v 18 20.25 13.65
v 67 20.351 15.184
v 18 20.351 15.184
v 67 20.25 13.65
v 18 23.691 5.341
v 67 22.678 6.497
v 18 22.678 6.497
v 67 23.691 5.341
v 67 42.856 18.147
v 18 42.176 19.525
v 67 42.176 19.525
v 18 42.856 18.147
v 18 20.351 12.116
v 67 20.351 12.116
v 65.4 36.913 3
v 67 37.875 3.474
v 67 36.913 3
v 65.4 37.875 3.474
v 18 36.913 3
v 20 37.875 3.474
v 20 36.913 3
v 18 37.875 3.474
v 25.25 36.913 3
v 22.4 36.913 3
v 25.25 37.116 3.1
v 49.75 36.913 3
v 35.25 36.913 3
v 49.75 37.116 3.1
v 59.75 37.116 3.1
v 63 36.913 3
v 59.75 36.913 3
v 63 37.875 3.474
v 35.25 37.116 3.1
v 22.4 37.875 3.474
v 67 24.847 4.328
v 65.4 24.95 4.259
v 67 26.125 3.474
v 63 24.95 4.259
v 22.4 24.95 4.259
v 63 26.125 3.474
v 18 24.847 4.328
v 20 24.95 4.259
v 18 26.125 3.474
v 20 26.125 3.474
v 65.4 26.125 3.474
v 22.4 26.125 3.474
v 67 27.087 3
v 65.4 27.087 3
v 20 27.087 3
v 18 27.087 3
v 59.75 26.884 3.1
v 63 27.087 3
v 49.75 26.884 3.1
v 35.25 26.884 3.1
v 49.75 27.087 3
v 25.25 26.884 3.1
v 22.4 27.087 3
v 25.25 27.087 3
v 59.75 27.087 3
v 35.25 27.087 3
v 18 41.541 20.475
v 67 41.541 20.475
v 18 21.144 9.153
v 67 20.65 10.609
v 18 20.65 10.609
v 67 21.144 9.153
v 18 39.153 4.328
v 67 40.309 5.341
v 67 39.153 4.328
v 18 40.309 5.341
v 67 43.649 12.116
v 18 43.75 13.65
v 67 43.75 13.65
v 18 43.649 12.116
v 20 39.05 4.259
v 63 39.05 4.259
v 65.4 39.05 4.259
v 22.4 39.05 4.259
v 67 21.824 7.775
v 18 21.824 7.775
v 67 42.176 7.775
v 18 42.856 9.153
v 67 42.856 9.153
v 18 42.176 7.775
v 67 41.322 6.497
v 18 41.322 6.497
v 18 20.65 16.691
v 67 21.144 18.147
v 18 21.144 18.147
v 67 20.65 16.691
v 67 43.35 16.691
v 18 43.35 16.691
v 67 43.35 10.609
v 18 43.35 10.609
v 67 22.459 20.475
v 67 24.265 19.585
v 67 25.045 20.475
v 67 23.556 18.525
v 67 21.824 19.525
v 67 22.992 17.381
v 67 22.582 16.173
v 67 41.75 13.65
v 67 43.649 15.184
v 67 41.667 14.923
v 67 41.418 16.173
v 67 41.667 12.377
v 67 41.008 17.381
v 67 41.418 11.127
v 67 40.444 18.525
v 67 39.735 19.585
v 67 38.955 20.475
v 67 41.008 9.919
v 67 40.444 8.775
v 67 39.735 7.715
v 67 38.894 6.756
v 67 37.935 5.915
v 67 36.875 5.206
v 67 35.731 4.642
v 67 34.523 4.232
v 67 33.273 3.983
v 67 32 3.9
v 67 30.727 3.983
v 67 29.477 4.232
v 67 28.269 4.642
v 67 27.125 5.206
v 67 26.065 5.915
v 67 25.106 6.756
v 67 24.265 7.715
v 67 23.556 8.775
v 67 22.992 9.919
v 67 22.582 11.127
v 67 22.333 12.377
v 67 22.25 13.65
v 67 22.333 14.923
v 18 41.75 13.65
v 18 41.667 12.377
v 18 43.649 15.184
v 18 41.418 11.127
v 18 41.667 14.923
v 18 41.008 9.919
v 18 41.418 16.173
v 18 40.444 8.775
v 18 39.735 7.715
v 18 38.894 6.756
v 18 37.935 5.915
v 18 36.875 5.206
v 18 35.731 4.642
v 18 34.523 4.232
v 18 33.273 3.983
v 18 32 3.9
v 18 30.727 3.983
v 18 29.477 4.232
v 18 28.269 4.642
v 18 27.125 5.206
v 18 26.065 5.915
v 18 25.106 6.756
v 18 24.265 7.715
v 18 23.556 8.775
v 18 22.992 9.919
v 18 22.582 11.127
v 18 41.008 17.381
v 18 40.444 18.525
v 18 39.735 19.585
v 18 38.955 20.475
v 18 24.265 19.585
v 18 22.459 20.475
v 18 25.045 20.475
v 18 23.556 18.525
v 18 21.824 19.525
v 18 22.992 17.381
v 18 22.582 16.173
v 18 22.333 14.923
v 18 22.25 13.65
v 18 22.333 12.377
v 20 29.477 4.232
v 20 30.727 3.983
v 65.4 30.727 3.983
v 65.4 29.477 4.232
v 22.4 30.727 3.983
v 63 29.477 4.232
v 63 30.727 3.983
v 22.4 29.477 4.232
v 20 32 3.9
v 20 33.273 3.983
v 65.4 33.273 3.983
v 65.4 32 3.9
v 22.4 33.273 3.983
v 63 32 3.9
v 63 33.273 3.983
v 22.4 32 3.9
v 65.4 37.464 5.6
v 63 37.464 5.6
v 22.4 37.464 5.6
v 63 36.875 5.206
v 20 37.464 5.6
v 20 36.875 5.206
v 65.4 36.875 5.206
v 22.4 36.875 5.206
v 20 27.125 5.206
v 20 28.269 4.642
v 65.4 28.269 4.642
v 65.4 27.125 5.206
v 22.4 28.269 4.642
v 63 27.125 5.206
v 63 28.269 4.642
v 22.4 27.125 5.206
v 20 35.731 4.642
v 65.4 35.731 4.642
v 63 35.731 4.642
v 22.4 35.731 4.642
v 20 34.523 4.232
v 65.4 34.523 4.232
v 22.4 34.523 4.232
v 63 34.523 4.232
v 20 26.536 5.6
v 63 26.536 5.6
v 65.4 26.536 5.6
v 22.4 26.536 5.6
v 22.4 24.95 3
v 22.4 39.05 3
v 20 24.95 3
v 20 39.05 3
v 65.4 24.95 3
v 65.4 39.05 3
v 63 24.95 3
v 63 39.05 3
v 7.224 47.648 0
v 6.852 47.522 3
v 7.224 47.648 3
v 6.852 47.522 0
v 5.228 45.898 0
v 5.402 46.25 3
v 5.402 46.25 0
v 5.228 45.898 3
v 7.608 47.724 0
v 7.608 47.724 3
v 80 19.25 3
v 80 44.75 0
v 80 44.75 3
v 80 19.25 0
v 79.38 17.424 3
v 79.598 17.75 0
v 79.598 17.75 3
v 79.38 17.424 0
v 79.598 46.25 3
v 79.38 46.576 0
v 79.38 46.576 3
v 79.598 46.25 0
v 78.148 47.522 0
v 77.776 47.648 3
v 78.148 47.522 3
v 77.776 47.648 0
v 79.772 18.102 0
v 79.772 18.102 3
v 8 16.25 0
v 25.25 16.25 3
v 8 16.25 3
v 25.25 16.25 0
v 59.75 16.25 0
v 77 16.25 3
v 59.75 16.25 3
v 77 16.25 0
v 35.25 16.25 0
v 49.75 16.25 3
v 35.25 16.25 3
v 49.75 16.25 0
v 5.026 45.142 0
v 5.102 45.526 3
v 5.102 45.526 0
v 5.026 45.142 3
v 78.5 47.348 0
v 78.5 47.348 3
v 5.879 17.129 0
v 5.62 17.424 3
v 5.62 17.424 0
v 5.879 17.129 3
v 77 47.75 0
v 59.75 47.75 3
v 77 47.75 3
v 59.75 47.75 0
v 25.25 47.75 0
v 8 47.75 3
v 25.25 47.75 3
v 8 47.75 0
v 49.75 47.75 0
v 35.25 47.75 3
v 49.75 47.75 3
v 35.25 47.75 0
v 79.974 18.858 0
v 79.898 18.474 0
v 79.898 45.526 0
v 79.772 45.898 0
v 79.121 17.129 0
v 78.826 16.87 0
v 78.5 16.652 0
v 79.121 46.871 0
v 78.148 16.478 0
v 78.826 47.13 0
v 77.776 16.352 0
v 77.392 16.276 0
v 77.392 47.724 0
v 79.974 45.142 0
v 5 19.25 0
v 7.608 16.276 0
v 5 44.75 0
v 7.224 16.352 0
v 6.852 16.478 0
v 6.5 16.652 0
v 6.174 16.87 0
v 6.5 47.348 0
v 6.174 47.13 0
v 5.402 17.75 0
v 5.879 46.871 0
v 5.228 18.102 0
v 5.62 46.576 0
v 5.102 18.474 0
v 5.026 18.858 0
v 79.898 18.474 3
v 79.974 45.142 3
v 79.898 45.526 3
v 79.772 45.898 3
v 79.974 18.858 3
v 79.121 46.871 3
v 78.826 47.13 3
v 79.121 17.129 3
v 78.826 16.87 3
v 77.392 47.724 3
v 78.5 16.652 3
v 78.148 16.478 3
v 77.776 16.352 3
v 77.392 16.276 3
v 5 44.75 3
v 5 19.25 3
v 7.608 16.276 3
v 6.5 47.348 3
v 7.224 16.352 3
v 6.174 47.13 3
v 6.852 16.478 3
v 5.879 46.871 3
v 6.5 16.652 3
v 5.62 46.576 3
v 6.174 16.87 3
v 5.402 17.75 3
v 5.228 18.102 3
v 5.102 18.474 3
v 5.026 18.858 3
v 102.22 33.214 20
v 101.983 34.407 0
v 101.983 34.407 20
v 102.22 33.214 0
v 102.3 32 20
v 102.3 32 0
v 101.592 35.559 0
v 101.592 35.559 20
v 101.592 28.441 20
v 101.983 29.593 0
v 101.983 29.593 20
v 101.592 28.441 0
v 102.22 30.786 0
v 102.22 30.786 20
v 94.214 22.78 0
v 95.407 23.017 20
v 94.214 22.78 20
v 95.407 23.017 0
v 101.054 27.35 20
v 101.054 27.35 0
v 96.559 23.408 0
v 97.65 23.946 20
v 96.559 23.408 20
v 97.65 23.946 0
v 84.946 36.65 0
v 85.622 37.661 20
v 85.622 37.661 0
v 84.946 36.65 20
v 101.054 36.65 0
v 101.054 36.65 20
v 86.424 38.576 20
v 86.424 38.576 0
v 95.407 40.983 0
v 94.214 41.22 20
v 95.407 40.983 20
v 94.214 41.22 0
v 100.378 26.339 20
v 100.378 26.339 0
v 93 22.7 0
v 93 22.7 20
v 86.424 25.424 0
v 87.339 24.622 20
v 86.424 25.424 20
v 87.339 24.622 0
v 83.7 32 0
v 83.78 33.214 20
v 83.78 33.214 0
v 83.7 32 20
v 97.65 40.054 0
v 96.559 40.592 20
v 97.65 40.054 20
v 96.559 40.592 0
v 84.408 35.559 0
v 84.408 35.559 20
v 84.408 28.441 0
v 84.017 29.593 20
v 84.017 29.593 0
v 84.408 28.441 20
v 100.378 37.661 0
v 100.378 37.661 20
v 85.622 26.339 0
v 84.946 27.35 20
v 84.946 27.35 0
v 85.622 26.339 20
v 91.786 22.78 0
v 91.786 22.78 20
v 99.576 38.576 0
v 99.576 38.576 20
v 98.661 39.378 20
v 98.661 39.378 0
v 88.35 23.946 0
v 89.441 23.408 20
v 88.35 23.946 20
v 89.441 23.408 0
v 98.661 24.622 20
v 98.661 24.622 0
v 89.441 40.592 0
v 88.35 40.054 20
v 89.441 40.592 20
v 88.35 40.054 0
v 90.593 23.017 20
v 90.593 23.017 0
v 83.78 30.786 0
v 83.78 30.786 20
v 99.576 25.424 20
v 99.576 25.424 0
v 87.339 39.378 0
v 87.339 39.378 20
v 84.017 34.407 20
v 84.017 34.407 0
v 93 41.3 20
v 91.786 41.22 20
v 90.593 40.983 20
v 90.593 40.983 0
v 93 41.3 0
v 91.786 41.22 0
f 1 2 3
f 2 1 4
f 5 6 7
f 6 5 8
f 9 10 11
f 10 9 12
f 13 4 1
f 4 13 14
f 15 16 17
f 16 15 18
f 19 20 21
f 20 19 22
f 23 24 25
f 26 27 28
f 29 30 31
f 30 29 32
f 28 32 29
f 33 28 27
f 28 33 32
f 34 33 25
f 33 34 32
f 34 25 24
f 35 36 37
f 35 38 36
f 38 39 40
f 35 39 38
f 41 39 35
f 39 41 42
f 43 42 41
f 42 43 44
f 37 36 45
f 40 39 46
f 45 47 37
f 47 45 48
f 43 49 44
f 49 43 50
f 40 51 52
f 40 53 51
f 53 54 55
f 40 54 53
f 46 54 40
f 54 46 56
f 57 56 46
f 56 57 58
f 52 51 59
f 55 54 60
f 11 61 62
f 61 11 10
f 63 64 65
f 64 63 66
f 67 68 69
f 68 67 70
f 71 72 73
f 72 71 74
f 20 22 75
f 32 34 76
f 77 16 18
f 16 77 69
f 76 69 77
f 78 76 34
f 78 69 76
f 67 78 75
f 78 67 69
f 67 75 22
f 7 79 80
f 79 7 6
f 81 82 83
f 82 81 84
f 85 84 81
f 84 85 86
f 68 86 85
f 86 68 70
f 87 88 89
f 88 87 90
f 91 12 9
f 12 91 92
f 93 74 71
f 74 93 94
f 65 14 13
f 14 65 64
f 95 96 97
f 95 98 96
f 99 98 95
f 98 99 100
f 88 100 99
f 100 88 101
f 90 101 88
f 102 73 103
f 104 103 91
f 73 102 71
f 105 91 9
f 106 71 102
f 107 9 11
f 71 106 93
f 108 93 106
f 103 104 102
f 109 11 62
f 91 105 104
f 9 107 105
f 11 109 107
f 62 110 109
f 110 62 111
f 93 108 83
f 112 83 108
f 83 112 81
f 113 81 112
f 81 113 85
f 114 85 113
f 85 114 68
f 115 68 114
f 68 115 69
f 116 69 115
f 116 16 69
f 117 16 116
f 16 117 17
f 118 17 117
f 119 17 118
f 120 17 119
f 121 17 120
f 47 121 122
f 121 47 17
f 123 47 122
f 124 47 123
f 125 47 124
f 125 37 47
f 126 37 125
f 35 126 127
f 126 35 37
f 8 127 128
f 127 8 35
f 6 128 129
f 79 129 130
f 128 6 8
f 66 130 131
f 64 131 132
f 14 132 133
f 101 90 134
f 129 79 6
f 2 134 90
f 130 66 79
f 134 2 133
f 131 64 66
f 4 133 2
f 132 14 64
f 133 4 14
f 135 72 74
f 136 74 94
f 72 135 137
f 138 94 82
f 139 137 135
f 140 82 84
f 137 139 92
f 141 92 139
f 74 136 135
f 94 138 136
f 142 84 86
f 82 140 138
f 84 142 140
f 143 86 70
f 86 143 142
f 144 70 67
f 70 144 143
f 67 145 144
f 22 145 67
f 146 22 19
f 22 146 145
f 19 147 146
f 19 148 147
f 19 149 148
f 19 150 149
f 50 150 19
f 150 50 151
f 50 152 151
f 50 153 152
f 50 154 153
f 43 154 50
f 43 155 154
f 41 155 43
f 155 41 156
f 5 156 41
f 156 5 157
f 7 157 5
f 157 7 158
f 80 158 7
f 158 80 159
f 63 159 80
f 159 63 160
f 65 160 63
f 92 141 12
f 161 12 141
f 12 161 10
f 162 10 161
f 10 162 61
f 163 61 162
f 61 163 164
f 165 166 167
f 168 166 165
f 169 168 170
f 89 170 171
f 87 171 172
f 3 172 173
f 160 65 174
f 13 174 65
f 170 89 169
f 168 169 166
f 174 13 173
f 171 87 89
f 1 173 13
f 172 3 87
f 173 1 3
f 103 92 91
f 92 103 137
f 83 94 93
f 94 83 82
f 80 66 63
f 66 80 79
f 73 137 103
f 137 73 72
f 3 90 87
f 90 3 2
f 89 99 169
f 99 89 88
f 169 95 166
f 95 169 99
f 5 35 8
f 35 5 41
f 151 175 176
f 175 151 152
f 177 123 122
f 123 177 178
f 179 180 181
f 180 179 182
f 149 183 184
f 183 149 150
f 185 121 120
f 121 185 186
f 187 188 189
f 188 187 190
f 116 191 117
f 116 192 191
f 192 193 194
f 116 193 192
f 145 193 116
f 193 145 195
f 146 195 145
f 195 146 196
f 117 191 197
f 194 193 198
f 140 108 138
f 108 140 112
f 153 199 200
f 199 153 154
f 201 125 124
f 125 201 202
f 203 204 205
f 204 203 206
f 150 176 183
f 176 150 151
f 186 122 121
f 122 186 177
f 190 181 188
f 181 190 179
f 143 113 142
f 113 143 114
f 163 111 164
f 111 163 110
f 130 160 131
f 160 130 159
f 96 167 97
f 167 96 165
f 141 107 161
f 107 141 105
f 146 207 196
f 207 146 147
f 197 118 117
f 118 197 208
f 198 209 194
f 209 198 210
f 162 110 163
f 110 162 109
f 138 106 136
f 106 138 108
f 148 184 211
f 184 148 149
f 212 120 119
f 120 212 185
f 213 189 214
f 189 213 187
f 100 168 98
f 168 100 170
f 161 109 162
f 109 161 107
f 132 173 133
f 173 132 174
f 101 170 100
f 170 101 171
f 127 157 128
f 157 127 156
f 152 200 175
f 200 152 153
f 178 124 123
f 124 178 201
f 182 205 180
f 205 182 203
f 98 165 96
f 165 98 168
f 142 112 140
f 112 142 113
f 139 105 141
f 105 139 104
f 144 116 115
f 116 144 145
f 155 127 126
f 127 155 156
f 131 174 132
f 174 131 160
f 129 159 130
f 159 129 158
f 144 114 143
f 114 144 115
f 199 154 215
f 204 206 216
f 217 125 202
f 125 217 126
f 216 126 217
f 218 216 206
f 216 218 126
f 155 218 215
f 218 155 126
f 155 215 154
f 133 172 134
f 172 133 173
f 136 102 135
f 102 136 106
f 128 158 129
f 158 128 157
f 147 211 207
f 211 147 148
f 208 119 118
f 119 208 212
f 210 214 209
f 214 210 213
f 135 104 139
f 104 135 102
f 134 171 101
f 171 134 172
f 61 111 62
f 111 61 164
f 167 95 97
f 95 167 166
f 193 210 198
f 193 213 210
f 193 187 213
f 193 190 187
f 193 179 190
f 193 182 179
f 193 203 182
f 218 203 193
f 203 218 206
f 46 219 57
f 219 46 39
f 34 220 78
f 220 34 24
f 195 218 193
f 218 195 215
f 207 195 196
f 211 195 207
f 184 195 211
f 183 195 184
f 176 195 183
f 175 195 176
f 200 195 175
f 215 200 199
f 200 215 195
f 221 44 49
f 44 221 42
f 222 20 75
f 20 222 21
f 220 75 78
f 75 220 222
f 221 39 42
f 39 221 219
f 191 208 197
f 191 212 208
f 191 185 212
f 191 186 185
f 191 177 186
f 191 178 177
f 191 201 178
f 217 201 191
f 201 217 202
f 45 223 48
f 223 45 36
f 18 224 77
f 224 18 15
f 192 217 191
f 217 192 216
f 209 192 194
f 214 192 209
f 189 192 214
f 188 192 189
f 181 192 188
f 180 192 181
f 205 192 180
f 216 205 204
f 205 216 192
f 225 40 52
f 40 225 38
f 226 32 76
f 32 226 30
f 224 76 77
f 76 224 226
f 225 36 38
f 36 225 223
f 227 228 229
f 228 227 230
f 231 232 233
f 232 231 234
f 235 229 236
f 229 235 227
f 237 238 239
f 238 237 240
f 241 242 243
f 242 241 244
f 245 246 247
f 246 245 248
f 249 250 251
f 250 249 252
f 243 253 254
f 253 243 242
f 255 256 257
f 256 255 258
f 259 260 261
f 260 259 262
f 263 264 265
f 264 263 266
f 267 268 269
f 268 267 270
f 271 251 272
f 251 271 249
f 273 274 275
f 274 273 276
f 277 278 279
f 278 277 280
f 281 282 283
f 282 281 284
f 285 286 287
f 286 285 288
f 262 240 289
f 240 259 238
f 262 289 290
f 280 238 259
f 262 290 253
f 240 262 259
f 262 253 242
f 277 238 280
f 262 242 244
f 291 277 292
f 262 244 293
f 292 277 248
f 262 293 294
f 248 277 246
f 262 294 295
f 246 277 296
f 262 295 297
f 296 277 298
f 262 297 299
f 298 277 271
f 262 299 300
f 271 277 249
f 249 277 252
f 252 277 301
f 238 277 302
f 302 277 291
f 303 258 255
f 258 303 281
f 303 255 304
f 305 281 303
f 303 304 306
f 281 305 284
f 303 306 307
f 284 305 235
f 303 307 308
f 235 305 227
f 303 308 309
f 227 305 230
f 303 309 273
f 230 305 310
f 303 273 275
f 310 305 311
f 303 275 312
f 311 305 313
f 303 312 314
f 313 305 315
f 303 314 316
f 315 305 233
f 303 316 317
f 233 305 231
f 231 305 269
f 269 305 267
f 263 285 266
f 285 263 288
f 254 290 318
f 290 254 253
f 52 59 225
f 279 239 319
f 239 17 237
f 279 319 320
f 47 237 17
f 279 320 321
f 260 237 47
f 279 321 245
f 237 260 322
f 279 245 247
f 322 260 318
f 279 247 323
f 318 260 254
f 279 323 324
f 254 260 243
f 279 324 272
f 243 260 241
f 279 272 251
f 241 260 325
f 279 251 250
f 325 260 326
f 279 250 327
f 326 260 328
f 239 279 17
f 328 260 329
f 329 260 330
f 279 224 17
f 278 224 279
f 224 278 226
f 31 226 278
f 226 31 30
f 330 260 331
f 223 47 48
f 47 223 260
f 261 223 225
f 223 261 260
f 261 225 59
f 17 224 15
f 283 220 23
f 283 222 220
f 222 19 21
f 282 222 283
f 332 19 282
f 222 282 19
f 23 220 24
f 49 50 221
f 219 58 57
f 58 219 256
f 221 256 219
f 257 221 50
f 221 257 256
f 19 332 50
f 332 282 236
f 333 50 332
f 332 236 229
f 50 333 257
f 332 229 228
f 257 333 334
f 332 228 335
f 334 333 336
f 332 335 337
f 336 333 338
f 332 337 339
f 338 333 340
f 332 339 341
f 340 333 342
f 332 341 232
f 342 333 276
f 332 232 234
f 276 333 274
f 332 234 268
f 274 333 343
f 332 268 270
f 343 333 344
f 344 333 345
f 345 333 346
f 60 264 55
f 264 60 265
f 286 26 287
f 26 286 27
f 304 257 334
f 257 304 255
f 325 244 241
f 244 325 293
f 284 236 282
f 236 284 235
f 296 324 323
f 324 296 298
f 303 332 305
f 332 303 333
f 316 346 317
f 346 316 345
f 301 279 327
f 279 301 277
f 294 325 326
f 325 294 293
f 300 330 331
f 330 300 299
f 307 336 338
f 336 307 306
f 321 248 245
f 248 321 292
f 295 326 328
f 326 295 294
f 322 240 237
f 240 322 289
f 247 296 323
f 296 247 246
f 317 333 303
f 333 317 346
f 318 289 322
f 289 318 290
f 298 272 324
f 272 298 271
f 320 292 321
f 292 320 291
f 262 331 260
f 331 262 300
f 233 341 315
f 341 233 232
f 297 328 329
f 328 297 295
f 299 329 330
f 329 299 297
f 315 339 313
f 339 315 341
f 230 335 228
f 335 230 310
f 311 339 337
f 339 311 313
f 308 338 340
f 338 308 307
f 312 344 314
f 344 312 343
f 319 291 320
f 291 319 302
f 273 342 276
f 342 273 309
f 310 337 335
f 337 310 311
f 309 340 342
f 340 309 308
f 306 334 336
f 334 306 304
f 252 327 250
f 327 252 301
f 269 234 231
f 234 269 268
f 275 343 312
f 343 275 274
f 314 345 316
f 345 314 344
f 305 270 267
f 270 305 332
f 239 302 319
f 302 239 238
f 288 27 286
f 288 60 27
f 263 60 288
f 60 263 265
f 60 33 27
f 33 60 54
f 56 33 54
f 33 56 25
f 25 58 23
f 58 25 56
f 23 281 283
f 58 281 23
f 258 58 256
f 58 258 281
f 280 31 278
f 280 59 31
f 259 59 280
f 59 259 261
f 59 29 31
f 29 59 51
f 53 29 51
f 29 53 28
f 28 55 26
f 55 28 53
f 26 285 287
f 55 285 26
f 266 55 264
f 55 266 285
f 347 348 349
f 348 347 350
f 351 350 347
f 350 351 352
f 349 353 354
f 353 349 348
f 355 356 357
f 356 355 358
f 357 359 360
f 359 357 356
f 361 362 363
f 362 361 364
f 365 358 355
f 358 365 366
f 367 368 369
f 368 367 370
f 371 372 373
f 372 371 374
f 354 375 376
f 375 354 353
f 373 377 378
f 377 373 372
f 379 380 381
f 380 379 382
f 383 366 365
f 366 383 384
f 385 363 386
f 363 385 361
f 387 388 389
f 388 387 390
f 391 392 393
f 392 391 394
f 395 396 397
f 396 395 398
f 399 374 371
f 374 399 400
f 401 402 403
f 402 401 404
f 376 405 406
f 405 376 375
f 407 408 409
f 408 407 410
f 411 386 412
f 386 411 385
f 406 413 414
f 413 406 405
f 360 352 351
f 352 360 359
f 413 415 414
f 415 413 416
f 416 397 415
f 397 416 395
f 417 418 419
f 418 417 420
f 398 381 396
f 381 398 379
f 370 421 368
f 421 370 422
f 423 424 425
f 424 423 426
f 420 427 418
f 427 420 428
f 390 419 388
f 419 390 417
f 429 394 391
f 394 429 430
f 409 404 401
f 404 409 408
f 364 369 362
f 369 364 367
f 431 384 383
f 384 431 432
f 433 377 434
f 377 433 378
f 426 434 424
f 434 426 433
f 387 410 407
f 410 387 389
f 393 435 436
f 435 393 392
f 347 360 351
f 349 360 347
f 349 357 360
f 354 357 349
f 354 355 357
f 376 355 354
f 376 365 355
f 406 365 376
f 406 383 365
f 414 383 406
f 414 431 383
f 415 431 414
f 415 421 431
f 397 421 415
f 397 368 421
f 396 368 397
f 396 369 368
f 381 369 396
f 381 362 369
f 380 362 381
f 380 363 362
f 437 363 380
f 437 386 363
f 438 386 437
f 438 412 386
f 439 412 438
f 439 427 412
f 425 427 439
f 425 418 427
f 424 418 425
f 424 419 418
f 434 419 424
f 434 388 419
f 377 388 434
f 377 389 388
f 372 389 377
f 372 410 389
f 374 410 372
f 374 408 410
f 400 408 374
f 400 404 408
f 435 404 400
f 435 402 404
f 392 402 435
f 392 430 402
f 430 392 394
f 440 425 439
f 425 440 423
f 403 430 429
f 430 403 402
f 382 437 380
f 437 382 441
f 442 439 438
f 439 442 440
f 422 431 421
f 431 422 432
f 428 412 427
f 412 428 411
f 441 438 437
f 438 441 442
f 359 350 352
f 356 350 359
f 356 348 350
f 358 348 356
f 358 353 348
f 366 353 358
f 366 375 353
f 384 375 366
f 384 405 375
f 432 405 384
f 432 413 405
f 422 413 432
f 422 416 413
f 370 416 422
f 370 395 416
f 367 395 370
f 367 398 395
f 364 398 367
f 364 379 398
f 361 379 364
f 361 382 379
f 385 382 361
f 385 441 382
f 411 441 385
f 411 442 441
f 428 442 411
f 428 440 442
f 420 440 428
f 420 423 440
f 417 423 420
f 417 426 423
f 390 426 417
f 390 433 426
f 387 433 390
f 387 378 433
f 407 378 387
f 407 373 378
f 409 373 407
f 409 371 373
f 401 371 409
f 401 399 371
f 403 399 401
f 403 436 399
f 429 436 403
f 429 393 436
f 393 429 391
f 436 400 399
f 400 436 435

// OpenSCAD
/*
Sample 152: Zylindrischer Zellhalter — 1 x 18650
Generated from the FDM Mechanical Sample Library.
Units: millimetres.

Override examples:
  openscad -o custom.stl -D 'view="plate"' -D 'render_fn=64' model.scad
  openscad -o preview.png -D 'view="assembly"' model.scad
*/
use <../../../library/fdm_mechanisms.scad>

render_fn = is_undef(render_fn) ? 48 : render_fn;
view = is_undef(view) ? "plate" : view;
$fn = render_fn;

sample_cell_cradle(
    view=view,
    cell_d=18.6,
    cell_l=65,
    count=1,
    cell_gap=2,
    clearance=0.45,
    strap_w=10,
    contact_keepout=8
);
